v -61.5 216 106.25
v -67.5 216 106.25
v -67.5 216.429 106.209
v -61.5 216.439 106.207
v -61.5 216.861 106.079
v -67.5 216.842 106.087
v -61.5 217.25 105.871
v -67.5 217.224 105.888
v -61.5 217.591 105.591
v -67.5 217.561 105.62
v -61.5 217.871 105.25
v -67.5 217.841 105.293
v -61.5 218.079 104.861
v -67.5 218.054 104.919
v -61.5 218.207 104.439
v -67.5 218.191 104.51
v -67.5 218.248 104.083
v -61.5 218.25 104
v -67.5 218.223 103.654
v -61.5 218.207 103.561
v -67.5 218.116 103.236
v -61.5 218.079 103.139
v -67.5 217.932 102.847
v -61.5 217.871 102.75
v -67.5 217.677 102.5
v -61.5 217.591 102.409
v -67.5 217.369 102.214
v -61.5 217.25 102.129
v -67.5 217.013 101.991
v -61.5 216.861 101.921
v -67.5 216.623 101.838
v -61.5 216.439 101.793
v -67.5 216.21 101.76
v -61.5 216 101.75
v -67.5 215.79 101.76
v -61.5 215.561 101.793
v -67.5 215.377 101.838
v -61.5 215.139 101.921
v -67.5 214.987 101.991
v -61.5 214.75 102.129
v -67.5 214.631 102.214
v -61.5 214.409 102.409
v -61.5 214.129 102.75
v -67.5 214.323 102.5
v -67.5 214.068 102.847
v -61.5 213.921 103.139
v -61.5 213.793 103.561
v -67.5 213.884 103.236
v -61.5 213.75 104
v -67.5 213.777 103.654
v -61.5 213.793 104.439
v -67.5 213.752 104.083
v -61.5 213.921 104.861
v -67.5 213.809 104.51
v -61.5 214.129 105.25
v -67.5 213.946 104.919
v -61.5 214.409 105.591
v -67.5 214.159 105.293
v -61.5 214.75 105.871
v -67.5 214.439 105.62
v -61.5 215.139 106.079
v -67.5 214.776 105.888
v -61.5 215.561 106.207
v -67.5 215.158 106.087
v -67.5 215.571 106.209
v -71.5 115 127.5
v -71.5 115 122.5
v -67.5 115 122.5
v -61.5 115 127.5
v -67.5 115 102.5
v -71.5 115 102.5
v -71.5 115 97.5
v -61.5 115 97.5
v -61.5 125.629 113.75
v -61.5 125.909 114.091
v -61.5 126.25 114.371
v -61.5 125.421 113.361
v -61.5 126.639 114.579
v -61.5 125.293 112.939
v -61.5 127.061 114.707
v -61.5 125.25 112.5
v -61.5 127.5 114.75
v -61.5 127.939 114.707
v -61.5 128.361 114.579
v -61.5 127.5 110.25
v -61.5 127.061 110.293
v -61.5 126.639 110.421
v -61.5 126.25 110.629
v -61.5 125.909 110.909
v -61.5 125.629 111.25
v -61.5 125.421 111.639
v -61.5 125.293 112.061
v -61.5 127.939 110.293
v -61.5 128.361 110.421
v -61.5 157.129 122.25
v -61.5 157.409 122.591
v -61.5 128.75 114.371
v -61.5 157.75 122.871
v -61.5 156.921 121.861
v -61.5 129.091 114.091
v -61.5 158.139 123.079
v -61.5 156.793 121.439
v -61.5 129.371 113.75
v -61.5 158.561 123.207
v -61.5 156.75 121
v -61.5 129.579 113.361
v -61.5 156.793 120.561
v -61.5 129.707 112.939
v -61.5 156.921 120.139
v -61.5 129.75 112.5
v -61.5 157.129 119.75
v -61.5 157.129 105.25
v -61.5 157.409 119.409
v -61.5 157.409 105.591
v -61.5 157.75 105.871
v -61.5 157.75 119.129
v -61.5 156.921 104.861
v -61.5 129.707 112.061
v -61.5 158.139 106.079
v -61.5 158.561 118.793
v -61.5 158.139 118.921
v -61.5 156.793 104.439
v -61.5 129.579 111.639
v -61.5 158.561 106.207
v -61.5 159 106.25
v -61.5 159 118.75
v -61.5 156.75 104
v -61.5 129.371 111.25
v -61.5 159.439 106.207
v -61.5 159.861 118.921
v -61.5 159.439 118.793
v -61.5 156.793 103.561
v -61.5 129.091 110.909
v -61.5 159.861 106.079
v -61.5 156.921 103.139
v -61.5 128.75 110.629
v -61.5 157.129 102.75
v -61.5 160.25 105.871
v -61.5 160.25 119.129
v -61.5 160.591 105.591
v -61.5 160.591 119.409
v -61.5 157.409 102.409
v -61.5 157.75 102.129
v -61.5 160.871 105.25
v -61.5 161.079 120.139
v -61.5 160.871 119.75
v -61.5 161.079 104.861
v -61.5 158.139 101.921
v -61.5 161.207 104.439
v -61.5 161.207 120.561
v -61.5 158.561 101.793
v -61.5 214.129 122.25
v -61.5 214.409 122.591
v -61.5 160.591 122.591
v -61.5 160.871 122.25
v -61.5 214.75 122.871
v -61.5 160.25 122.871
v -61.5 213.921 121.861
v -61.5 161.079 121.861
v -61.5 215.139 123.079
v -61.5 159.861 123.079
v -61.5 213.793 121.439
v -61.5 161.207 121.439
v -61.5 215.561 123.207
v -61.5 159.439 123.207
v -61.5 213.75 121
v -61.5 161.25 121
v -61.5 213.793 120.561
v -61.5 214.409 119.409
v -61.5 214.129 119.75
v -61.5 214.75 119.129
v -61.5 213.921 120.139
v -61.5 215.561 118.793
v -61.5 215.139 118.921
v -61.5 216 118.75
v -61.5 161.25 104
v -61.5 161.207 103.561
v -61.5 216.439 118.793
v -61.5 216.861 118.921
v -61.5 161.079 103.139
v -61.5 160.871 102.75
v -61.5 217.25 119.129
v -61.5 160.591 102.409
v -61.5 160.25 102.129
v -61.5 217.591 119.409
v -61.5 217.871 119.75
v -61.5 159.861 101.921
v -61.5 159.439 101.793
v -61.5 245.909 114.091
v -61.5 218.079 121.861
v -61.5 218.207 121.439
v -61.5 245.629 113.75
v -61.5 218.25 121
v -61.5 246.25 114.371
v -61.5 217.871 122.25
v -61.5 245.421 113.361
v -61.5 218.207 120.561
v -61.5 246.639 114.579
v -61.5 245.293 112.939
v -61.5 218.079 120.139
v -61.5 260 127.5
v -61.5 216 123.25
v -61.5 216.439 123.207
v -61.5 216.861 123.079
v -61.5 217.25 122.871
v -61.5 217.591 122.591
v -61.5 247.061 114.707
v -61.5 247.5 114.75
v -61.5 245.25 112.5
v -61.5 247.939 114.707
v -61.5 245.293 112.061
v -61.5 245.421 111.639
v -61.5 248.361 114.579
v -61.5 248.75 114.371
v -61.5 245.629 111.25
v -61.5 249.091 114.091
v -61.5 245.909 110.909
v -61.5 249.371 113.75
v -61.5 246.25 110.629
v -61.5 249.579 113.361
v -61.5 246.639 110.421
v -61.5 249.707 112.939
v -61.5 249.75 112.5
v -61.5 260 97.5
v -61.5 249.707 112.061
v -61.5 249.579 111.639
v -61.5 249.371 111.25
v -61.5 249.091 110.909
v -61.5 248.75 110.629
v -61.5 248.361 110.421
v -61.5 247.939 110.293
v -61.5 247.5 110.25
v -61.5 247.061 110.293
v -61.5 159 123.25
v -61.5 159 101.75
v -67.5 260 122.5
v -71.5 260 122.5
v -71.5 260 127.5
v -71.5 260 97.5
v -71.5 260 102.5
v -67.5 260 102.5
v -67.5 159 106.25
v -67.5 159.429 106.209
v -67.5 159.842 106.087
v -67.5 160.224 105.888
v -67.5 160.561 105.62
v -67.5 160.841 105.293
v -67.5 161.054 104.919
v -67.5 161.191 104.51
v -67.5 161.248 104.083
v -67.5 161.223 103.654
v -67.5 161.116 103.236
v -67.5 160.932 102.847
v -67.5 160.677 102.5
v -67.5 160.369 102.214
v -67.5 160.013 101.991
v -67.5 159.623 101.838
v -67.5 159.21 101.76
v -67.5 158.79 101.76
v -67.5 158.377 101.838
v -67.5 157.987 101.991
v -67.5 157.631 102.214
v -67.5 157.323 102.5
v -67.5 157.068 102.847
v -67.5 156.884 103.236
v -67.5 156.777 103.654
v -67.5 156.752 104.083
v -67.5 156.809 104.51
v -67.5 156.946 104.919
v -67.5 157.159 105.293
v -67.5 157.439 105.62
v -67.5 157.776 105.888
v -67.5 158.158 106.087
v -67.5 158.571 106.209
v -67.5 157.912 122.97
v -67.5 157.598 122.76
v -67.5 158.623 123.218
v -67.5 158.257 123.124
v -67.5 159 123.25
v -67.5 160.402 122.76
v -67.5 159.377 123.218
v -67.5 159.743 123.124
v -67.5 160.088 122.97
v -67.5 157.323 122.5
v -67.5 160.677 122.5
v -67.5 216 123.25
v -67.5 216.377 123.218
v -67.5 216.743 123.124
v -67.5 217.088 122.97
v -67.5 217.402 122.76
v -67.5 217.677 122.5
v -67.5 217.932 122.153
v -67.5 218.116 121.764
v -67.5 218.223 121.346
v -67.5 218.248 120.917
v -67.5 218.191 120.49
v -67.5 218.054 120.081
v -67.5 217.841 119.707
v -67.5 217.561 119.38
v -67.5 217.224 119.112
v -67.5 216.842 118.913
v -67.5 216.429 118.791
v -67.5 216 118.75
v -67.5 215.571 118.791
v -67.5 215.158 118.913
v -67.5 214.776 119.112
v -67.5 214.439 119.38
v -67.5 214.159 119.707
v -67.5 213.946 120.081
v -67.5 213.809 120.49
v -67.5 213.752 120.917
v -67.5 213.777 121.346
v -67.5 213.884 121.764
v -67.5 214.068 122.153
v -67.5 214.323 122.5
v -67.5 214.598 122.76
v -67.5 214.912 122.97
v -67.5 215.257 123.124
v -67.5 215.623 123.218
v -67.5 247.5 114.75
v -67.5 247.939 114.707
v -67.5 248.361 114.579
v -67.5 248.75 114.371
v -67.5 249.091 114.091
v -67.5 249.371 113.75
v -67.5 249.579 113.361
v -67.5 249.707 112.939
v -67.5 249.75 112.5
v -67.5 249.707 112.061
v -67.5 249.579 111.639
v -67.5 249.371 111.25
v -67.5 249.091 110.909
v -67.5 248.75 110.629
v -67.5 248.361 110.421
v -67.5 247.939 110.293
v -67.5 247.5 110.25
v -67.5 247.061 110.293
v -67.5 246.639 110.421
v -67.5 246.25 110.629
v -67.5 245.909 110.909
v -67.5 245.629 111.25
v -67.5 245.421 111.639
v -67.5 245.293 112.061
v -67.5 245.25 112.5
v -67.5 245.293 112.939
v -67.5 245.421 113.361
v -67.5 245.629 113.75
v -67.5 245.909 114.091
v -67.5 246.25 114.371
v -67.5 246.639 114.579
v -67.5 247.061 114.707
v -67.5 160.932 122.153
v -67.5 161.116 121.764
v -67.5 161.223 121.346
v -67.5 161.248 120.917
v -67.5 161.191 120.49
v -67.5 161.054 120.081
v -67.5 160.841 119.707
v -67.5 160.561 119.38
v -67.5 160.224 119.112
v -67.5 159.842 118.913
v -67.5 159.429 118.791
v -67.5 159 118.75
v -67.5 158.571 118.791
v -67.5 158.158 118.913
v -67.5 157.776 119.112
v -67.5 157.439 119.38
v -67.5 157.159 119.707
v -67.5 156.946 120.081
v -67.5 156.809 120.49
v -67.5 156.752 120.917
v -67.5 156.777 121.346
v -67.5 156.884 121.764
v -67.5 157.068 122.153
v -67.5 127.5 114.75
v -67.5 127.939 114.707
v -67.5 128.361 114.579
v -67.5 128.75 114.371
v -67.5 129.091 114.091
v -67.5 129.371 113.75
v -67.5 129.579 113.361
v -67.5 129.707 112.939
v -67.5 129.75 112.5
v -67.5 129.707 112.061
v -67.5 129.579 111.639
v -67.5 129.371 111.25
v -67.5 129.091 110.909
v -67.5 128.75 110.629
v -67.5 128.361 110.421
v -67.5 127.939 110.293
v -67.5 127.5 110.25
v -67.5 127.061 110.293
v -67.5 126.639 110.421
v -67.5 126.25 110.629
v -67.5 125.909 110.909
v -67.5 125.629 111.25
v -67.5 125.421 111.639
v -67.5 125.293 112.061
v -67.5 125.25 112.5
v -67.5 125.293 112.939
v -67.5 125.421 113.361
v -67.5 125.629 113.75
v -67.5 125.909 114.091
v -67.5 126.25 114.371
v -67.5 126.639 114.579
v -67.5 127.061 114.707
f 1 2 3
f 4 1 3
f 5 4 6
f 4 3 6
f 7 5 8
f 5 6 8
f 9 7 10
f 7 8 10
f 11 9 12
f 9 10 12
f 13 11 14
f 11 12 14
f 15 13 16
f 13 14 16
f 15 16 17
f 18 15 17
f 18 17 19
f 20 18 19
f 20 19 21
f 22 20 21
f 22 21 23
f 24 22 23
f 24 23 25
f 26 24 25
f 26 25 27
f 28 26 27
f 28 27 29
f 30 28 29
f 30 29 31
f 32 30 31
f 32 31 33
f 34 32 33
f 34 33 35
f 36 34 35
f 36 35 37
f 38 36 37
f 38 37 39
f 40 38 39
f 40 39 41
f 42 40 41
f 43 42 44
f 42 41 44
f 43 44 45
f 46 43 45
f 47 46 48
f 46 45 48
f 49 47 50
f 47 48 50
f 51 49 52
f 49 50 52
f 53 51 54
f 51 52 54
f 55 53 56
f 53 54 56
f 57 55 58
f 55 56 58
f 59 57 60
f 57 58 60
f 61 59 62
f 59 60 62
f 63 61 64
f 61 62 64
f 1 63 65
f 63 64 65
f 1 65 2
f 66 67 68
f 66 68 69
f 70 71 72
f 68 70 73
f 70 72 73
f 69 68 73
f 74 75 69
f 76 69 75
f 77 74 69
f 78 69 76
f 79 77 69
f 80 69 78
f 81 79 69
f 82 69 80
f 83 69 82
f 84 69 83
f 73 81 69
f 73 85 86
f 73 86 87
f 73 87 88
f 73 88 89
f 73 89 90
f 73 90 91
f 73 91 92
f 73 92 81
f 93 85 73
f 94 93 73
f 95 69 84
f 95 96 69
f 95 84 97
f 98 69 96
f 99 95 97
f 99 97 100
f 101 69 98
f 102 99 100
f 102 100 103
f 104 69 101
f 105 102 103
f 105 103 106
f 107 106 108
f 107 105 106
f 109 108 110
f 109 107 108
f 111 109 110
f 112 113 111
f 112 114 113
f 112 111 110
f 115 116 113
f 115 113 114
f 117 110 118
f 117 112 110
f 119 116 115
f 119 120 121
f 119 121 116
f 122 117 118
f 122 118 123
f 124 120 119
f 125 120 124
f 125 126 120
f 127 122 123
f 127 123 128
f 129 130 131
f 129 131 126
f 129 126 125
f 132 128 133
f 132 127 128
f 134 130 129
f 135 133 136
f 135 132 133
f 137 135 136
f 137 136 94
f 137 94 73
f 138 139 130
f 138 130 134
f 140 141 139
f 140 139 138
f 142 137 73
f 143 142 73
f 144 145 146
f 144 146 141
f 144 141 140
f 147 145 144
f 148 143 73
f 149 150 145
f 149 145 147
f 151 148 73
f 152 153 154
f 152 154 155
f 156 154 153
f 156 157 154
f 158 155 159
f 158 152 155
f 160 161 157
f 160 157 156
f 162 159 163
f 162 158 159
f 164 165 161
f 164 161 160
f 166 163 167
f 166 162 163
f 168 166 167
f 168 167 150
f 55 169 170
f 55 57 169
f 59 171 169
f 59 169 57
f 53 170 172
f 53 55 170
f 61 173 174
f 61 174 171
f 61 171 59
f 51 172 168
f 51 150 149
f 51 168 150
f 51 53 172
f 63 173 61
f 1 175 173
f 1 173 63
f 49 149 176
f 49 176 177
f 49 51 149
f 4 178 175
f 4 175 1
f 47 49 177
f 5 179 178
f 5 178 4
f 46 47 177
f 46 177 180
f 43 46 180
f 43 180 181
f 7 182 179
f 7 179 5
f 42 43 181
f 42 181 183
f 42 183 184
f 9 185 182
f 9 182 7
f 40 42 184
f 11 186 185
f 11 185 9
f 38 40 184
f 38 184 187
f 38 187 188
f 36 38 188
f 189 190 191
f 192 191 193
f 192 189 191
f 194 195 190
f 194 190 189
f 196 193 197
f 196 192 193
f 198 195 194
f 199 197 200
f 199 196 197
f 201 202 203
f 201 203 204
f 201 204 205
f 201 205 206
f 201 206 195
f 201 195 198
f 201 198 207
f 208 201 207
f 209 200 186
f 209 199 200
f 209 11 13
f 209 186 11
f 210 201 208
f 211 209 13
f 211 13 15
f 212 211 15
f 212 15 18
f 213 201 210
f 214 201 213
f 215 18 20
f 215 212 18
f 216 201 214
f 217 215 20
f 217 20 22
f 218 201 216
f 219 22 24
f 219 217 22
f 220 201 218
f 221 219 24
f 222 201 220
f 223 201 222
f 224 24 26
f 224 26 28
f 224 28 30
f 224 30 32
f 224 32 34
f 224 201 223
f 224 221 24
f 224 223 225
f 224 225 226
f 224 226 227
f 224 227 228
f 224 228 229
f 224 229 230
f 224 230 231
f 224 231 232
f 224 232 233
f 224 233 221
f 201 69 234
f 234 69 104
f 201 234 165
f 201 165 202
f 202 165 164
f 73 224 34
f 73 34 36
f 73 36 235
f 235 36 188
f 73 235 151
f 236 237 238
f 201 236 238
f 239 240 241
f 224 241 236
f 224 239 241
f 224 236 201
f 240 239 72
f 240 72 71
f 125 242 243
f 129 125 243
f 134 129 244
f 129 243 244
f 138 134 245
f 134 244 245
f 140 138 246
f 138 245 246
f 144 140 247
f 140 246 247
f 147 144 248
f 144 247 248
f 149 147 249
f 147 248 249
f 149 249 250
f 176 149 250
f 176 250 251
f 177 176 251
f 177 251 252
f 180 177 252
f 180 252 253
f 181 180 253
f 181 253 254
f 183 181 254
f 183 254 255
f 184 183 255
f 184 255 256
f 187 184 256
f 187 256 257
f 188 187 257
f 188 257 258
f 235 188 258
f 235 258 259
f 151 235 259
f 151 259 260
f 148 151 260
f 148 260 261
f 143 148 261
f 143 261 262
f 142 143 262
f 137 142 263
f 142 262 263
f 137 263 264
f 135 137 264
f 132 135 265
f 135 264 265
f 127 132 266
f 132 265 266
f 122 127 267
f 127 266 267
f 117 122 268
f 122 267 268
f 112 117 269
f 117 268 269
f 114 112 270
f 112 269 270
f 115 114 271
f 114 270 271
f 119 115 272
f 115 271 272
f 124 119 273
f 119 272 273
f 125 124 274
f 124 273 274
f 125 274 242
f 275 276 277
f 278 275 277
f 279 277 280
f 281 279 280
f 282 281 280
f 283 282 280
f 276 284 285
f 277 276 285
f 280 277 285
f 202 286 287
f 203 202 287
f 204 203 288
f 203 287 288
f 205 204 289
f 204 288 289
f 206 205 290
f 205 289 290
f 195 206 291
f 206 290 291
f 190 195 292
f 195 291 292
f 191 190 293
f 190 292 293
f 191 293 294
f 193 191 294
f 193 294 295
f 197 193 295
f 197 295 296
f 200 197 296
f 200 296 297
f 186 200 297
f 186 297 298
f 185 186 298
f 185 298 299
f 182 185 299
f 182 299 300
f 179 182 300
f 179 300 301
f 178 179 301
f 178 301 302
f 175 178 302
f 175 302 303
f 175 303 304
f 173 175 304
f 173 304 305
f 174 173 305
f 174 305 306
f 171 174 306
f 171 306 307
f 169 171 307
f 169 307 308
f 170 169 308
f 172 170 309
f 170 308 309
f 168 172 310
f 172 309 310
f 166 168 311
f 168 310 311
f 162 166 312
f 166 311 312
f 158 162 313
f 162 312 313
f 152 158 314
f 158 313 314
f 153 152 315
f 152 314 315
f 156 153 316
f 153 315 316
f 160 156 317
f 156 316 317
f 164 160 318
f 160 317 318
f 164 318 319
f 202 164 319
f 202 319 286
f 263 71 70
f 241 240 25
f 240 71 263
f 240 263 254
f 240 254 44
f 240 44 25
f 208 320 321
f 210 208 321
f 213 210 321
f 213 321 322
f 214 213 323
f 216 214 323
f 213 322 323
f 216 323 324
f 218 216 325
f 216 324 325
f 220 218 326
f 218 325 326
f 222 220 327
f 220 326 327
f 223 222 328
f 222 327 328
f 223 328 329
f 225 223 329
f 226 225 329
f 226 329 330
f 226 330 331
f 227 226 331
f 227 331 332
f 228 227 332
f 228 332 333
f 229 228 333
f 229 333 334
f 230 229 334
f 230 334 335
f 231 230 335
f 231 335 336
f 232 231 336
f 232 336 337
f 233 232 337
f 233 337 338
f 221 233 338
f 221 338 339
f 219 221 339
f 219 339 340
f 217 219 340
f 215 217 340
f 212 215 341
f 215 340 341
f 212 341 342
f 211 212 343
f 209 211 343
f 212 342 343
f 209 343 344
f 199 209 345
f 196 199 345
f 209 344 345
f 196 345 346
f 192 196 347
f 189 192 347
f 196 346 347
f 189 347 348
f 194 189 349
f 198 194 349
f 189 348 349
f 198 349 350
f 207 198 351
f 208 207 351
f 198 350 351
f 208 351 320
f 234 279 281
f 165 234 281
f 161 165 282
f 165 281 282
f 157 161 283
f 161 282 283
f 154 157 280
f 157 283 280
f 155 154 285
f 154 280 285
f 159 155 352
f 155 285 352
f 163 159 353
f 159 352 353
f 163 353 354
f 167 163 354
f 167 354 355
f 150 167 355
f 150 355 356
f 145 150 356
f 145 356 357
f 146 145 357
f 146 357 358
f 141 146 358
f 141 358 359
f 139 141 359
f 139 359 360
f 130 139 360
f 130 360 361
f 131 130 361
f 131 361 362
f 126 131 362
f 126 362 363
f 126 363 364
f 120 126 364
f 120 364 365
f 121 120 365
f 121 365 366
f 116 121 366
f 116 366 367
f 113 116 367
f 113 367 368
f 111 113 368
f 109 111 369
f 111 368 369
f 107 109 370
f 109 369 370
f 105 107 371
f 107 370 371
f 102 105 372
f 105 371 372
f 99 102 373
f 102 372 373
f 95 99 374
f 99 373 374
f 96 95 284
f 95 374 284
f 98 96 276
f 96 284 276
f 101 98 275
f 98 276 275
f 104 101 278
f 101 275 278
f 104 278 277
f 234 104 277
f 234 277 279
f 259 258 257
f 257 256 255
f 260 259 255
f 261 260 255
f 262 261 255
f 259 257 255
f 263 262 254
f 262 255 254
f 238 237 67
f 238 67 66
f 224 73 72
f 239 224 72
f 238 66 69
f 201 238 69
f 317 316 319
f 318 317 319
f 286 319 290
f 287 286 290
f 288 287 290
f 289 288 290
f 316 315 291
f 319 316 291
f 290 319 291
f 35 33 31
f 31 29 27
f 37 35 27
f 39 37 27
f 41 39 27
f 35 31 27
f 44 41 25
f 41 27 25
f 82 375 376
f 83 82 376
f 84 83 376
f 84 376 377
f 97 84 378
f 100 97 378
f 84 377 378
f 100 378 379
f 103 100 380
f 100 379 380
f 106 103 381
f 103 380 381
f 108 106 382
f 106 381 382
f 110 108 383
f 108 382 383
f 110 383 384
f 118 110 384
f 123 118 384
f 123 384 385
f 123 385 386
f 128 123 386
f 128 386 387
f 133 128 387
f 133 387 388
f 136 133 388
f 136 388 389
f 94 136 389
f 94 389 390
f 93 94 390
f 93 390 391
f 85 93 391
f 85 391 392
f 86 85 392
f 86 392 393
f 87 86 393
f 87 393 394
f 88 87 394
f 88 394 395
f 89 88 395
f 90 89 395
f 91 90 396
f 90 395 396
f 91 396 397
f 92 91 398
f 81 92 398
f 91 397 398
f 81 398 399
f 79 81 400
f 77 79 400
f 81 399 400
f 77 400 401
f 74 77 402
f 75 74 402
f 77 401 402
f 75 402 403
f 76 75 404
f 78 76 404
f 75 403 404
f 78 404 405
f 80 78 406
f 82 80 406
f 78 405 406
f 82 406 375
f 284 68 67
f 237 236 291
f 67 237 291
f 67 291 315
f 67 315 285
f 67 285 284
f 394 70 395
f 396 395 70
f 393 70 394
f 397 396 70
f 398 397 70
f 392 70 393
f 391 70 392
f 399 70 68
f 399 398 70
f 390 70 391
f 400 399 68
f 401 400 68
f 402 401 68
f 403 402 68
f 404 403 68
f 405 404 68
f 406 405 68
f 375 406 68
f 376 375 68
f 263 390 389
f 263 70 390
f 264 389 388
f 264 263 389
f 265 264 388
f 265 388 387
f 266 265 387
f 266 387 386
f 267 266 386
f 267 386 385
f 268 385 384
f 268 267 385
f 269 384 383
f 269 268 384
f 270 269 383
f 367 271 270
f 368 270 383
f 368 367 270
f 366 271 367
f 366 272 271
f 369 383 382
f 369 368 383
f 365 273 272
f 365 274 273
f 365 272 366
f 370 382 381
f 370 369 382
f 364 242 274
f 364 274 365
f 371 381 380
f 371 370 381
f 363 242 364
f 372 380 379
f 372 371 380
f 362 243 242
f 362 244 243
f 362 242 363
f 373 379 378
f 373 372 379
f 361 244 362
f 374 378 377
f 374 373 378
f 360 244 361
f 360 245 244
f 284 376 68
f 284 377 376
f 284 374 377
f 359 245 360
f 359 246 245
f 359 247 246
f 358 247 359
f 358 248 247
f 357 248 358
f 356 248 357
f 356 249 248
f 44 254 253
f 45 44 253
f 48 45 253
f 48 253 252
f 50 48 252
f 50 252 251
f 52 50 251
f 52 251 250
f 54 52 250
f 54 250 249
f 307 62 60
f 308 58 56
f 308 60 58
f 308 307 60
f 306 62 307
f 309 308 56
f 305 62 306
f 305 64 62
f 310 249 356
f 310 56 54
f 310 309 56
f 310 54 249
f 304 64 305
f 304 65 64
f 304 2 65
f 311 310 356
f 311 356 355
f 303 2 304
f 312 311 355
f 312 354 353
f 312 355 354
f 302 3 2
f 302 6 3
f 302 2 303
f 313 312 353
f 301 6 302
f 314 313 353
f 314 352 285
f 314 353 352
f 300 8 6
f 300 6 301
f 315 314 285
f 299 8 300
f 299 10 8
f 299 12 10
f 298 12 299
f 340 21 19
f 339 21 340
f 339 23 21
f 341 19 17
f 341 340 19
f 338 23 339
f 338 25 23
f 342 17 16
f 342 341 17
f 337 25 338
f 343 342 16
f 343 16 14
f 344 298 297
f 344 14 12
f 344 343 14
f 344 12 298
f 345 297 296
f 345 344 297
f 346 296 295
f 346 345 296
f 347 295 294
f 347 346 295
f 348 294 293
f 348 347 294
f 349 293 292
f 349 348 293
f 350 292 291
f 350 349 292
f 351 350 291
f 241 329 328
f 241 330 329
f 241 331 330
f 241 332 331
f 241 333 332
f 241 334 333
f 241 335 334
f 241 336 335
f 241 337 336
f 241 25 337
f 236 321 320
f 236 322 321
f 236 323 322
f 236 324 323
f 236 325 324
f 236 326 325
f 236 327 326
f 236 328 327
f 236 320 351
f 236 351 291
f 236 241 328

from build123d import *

# Parameters (mm, degrees)
BOSS_EXTRUDE1_DEPTH  = 145
M4_CLEARANCE_HOLE1_D = 4.5
HOLE1_D              = 4.5
HOLE1_DEPTH          = 6


with BuildPart() as part:
    # Sketch1 → Boss-Extrude1 (new body)
    with BuildSketch(Plane(origin=(0, 260, 0), x_dir=(-1, 0, 0), z_dir=(0, -1, 0))):
        Polygon((71.5, -127.5), (61.5, -127.5), (61.5, -97.5), (71.5, -97.5), (71.5, -102.5), (67.5, -102.5), (67.5, -122.5), (71.5, -122.5), align=None)
    extrude(amount=BOSS_EXTRUDE1_DEPTH)

    # M4 Clearance Hole1 (through all)
    with Locations(Plane(origin=(-61.5, 0, 0), x_dir=(0, 0, -1), z_dir=(1, 0, 0))):
        with Locations((-112.5, 247.5), (-112.5, 127.5)):
            Hole(M4_CLEARANCE_HOLE1_D / 2)

    # Hole1
    with Locations(Plane(origin=(-61.5, 0, 0), x_dir=(0, 0, -1), z_dir=(1, 0, 0))):
        with Locations((-104, 216), (-121, 216), (-104, 159), (-121, 159)):
            Hole(HOLE1_D / 2, depth=HOLE1_DEPTH)


solid = part.part
